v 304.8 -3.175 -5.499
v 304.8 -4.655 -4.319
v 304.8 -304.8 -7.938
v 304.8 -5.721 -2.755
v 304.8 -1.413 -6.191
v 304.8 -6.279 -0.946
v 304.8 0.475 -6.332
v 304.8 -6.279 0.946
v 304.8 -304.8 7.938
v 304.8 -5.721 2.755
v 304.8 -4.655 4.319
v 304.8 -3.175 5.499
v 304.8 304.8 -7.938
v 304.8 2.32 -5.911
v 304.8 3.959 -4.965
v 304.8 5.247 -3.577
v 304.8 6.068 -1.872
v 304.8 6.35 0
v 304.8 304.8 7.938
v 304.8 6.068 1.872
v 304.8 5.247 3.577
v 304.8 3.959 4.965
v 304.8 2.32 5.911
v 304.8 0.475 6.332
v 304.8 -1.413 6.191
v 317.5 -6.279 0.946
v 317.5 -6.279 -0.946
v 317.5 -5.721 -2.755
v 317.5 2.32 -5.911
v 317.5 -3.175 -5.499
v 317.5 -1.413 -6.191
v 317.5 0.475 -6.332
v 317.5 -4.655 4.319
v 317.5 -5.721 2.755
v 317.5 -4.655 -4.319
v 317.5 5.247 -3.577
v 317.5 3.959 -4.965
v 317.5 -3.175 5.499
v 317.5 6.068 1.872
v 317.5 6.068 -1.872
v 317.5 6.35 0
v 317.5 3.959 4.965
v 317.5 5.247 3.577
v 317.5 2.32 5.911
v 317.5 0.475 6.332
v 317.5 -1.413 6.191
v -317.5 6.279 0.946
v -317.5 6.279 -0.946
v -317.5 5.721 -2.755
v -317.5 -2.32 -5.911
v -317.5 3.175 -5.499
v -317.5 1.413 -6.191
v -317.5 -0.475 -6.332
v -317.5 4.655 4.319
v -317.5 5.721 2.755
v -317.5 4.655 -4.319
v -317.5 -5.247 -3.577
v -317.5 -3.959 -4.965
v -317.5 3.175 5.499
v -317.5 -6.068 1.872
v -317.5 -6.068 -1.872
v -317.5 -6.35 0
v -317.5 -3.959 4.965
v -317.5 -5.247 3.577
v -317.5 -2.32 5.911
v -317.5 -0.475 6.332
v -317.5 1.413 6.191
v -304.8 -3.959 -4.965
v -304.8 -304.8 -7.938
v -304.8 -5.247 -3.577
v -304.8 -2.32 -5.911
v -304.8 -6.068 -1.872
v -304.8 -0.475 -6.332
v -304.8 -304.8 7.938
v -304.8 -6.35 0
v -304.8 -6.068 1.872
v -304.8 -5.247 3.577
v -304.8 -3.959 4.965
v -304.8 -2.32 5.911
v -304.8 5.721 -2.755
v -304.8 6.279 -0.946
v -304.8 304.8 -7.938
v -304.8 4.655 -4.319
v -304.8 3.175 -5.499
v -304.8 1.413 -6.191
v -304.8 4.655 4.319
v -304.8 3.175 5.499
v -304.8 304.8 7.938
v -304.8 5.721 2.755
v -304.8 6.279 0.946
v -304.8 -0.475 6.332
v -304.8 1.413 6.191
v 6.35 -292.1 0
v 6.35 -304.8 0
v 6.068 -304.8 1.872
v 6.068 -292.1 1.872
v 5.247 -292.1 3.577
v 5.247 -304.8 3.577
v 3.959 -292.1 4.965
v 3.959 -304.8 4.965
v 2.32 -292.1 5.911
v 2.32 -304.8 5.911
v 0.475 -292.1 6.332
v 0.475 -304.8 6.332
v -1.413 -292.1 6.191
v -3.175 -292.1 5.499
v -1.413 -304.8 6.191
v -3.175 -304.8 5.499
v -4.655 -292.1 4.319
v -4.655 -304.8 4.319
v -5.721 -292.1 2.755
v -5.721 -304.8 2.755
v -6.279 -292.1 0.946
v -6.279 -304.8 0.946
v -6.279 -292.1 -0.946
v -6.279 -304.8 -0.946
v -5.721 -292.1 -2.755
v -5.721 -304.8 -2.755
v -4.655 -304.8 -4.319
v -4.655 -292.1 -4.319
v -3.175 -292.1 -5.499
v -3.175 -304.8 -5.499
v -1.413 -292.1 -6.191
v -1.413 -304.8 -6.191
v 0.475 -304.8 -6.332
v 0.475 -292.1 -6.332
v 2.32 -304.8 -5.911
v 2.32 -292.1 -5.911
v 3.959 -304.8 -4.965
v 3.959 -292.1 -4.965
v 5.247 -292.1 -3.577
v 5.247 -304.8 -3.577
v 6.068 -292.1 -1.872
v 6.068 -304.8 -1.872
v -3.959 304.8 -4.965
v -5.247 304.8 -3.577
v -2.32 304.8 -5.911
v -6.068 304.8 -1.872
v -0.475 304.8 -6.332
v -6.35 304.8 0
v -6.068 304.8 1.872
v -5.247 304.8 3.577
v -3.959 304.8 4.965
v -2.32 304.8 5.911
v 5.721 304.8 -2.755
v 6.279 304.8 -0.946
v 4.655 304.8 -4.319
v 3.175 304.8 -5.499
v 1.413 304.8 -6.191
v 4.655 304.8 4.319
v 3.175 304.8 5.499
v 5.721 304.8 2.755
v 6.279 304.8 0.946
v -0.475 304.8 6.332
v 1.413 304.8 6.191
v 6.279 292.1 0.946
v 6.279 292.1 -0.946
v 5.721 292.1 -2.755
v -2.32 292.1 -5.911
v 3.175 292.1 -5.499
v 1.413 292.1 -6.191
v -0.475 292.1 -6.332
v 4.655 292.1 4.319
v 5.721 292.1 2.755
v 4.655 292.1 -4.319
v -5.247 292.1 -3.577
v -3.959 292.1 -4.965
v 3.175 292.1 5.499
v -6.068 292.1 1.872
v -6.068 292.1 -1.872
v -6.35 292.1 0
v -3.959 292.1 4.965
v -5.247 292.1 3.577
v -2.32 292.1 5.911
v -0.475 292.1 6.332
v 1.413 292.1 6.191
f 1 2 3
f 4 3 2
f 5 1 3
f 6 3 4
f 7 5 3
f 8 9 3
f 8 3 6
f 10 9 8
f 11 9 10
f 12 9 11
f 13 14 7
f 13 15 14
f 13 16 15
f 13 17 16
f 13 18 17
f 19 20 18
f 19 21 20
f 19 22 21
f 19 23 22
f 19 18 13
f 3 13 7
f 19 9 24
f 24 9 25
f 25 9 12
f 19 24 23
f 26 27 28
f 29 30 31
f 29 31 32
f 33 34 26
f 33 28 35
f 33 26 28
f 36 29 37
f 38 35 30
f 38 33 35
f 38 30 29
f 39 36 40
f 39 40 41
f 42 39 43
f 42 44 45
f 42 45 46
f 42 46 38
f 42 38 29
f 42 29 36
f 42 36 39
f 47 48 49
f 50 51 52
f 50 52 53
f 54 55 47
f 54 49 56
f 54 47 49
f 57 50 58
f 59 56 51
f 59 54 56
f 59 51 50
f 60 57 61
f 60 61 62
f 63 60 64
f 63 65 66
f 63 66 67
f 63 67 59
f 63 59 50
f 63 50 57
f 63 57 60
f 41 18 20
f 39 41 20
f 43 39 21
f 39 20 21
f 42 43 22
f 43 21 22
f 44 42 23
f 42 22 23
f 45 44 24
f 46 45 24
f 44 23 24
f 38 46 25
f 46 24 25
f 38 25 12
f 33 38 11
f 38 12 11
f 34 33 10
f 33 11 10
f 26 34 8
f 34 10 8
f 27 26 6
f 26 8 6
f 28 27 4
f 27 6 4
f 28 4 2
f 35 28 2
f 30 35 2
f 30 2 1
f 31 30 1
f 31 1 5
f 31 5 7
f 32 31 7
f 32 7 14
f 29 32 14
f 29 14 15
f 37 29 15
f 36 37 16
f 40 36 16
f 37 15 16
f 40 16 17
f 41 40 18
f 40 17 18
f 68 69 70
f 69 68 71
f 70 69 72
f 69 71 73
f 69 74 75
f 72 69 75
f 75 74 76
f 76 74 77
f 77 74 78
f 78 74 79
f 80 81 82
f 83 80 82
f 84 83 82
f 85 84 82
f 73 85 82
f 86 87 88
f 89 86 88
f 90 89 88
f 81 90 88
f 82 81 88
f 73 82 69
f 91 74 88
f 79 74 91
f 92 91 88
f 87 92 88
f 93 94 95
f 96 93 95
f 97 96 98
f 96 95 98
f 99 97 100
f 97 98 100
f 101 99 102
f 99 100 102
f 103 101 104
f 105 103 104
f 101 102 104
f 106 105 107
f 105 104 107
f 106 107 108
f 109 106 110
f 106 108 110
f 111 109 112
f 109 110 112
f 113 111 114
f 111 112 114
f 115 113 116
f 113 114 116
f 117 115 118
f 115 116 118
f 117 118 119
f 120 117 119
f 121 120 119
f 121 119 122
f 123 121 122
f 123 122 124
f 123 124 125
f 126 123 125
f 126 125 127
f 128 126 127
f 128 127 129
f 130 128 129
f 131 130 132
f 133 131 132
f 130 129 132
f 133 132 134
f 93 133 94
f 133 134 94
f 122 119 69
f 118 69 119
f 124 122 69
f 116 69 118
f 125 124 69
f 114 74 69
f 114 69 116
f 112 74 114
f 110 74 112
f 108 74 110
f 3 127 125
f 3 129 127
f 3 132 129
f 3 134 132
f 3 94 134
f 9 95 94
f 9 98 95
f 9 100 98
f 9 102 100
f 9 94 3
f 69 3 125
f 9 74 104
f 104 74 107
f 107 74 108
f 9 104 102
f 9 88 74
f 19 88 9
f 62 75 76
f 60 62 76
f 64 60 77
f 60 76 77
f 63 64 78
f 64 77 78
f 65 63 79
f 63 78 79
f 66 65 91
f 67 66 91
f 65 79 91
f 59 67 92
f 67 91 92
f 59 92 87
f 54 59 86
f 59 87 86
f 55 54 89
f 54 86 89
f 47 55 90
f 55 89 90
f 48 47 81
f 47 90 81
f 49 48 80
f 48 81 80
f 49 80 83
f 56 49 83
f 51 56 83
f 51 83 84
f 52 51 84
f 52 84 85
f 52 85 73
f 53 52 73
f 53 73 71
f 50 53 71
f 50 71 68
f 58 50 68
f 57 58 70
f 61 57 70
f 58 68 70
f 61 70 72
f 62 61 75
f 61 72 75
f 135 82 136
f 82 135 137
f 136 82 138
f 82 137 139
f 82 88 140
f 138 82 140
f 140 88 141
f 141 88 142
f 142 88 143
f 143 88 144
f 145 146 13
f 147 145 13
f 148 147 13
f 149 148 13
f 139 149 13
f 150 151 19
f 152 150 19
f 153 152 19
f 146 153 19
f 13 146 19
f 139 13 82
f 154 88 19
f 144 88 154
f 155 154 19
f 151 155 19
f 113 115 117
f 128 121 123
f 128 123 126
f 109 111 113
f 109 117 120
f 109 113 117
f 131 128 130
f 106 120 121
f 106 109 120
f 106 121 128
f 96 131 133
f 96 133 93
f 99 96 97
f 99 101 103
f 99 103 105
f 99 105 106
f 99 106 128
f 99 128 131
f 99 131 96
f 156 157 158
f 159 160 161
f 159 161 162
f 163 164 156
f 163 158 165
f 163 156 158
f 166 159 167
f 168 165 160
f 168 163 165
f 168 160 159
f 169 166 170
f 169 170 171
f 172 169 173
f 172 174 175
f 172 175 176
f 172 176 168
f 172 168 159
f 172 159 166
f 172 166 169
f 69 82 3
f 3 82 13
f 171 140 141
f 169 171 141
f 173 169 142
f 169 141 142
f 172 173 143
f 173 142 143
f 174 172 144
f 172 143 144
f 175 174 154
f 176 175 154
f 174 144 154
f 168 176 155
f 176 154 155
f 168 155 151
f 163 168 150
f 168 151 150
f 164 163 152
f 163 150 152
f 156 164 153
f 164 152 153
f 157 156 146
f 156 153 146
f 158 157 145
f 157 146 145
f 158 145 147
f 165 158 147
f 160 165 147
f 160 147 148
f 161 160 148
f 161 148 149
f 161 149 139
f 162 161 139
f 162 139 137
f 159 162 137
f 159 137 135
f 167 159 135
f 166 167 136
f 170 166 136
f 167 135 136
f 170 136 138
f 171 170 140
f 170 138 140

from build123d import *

# Parameters (mm, degrees)
F0_W     = 609.6
F0_H     = 609.6
F1_DEPTH = 7.9375
F2_R     = 6.35
F3_DEPTH = 12.7
F4_R     = 6.35
F5_DEPTH = 12.7
F6_R     = 6.35
F7_DEPTH = 12.7
F8_R     = 6.35
F9_DEPTH = 12.7


# Not quite as in the source:
# - a length typed as a fraction of an inch, garbled in the dataset ("3 / 203.2 mm" for 3/8 in), is restored


with BuildPart() as f1:
    # F0 (on Top) → F1 (new body, symmetric)
    with BuildSketch(Plane.XY):
        Rectangle(F0_W, F0_H)
    extrude(amount=F1_DEPTH, both=True)

    # F2 (on face) → F3 (join)
    with BuildSketch(Plane.YZ.offset(304.8)):
        Circle(F2_R)
    extrude(amount=F3_DEPTH)

    # F4 (on face) → F5 (cut)
    with BuildSketch(Plane.XZ.offset(304.8)):
        Circle(F4_R)
    extrude(amount=-F5_DEPTH, mode=Mode.SUBTRACT)

    # F6 (on face) → F7 (join)
    with BuildSketch(Plane(origin=(-304.8, 0, 0), x_dir=(0, -1, 0), z_dir=(-1, 0, 0))):
        Circle(F6_R)
    extrude(amount=F7_DEPTH)

    # F8 (on face) → F9 (cut)
    with BuildSketch(Plane(origin=(0, 304.8, 0), x_dir=(-1, 0, 0), z_dir=(0, 1, 0))):
        Circle(F8_R)
    extrude(amount=-F9_DEPTH, mode=Mode.SUBTRACT)


solid = f1.part
